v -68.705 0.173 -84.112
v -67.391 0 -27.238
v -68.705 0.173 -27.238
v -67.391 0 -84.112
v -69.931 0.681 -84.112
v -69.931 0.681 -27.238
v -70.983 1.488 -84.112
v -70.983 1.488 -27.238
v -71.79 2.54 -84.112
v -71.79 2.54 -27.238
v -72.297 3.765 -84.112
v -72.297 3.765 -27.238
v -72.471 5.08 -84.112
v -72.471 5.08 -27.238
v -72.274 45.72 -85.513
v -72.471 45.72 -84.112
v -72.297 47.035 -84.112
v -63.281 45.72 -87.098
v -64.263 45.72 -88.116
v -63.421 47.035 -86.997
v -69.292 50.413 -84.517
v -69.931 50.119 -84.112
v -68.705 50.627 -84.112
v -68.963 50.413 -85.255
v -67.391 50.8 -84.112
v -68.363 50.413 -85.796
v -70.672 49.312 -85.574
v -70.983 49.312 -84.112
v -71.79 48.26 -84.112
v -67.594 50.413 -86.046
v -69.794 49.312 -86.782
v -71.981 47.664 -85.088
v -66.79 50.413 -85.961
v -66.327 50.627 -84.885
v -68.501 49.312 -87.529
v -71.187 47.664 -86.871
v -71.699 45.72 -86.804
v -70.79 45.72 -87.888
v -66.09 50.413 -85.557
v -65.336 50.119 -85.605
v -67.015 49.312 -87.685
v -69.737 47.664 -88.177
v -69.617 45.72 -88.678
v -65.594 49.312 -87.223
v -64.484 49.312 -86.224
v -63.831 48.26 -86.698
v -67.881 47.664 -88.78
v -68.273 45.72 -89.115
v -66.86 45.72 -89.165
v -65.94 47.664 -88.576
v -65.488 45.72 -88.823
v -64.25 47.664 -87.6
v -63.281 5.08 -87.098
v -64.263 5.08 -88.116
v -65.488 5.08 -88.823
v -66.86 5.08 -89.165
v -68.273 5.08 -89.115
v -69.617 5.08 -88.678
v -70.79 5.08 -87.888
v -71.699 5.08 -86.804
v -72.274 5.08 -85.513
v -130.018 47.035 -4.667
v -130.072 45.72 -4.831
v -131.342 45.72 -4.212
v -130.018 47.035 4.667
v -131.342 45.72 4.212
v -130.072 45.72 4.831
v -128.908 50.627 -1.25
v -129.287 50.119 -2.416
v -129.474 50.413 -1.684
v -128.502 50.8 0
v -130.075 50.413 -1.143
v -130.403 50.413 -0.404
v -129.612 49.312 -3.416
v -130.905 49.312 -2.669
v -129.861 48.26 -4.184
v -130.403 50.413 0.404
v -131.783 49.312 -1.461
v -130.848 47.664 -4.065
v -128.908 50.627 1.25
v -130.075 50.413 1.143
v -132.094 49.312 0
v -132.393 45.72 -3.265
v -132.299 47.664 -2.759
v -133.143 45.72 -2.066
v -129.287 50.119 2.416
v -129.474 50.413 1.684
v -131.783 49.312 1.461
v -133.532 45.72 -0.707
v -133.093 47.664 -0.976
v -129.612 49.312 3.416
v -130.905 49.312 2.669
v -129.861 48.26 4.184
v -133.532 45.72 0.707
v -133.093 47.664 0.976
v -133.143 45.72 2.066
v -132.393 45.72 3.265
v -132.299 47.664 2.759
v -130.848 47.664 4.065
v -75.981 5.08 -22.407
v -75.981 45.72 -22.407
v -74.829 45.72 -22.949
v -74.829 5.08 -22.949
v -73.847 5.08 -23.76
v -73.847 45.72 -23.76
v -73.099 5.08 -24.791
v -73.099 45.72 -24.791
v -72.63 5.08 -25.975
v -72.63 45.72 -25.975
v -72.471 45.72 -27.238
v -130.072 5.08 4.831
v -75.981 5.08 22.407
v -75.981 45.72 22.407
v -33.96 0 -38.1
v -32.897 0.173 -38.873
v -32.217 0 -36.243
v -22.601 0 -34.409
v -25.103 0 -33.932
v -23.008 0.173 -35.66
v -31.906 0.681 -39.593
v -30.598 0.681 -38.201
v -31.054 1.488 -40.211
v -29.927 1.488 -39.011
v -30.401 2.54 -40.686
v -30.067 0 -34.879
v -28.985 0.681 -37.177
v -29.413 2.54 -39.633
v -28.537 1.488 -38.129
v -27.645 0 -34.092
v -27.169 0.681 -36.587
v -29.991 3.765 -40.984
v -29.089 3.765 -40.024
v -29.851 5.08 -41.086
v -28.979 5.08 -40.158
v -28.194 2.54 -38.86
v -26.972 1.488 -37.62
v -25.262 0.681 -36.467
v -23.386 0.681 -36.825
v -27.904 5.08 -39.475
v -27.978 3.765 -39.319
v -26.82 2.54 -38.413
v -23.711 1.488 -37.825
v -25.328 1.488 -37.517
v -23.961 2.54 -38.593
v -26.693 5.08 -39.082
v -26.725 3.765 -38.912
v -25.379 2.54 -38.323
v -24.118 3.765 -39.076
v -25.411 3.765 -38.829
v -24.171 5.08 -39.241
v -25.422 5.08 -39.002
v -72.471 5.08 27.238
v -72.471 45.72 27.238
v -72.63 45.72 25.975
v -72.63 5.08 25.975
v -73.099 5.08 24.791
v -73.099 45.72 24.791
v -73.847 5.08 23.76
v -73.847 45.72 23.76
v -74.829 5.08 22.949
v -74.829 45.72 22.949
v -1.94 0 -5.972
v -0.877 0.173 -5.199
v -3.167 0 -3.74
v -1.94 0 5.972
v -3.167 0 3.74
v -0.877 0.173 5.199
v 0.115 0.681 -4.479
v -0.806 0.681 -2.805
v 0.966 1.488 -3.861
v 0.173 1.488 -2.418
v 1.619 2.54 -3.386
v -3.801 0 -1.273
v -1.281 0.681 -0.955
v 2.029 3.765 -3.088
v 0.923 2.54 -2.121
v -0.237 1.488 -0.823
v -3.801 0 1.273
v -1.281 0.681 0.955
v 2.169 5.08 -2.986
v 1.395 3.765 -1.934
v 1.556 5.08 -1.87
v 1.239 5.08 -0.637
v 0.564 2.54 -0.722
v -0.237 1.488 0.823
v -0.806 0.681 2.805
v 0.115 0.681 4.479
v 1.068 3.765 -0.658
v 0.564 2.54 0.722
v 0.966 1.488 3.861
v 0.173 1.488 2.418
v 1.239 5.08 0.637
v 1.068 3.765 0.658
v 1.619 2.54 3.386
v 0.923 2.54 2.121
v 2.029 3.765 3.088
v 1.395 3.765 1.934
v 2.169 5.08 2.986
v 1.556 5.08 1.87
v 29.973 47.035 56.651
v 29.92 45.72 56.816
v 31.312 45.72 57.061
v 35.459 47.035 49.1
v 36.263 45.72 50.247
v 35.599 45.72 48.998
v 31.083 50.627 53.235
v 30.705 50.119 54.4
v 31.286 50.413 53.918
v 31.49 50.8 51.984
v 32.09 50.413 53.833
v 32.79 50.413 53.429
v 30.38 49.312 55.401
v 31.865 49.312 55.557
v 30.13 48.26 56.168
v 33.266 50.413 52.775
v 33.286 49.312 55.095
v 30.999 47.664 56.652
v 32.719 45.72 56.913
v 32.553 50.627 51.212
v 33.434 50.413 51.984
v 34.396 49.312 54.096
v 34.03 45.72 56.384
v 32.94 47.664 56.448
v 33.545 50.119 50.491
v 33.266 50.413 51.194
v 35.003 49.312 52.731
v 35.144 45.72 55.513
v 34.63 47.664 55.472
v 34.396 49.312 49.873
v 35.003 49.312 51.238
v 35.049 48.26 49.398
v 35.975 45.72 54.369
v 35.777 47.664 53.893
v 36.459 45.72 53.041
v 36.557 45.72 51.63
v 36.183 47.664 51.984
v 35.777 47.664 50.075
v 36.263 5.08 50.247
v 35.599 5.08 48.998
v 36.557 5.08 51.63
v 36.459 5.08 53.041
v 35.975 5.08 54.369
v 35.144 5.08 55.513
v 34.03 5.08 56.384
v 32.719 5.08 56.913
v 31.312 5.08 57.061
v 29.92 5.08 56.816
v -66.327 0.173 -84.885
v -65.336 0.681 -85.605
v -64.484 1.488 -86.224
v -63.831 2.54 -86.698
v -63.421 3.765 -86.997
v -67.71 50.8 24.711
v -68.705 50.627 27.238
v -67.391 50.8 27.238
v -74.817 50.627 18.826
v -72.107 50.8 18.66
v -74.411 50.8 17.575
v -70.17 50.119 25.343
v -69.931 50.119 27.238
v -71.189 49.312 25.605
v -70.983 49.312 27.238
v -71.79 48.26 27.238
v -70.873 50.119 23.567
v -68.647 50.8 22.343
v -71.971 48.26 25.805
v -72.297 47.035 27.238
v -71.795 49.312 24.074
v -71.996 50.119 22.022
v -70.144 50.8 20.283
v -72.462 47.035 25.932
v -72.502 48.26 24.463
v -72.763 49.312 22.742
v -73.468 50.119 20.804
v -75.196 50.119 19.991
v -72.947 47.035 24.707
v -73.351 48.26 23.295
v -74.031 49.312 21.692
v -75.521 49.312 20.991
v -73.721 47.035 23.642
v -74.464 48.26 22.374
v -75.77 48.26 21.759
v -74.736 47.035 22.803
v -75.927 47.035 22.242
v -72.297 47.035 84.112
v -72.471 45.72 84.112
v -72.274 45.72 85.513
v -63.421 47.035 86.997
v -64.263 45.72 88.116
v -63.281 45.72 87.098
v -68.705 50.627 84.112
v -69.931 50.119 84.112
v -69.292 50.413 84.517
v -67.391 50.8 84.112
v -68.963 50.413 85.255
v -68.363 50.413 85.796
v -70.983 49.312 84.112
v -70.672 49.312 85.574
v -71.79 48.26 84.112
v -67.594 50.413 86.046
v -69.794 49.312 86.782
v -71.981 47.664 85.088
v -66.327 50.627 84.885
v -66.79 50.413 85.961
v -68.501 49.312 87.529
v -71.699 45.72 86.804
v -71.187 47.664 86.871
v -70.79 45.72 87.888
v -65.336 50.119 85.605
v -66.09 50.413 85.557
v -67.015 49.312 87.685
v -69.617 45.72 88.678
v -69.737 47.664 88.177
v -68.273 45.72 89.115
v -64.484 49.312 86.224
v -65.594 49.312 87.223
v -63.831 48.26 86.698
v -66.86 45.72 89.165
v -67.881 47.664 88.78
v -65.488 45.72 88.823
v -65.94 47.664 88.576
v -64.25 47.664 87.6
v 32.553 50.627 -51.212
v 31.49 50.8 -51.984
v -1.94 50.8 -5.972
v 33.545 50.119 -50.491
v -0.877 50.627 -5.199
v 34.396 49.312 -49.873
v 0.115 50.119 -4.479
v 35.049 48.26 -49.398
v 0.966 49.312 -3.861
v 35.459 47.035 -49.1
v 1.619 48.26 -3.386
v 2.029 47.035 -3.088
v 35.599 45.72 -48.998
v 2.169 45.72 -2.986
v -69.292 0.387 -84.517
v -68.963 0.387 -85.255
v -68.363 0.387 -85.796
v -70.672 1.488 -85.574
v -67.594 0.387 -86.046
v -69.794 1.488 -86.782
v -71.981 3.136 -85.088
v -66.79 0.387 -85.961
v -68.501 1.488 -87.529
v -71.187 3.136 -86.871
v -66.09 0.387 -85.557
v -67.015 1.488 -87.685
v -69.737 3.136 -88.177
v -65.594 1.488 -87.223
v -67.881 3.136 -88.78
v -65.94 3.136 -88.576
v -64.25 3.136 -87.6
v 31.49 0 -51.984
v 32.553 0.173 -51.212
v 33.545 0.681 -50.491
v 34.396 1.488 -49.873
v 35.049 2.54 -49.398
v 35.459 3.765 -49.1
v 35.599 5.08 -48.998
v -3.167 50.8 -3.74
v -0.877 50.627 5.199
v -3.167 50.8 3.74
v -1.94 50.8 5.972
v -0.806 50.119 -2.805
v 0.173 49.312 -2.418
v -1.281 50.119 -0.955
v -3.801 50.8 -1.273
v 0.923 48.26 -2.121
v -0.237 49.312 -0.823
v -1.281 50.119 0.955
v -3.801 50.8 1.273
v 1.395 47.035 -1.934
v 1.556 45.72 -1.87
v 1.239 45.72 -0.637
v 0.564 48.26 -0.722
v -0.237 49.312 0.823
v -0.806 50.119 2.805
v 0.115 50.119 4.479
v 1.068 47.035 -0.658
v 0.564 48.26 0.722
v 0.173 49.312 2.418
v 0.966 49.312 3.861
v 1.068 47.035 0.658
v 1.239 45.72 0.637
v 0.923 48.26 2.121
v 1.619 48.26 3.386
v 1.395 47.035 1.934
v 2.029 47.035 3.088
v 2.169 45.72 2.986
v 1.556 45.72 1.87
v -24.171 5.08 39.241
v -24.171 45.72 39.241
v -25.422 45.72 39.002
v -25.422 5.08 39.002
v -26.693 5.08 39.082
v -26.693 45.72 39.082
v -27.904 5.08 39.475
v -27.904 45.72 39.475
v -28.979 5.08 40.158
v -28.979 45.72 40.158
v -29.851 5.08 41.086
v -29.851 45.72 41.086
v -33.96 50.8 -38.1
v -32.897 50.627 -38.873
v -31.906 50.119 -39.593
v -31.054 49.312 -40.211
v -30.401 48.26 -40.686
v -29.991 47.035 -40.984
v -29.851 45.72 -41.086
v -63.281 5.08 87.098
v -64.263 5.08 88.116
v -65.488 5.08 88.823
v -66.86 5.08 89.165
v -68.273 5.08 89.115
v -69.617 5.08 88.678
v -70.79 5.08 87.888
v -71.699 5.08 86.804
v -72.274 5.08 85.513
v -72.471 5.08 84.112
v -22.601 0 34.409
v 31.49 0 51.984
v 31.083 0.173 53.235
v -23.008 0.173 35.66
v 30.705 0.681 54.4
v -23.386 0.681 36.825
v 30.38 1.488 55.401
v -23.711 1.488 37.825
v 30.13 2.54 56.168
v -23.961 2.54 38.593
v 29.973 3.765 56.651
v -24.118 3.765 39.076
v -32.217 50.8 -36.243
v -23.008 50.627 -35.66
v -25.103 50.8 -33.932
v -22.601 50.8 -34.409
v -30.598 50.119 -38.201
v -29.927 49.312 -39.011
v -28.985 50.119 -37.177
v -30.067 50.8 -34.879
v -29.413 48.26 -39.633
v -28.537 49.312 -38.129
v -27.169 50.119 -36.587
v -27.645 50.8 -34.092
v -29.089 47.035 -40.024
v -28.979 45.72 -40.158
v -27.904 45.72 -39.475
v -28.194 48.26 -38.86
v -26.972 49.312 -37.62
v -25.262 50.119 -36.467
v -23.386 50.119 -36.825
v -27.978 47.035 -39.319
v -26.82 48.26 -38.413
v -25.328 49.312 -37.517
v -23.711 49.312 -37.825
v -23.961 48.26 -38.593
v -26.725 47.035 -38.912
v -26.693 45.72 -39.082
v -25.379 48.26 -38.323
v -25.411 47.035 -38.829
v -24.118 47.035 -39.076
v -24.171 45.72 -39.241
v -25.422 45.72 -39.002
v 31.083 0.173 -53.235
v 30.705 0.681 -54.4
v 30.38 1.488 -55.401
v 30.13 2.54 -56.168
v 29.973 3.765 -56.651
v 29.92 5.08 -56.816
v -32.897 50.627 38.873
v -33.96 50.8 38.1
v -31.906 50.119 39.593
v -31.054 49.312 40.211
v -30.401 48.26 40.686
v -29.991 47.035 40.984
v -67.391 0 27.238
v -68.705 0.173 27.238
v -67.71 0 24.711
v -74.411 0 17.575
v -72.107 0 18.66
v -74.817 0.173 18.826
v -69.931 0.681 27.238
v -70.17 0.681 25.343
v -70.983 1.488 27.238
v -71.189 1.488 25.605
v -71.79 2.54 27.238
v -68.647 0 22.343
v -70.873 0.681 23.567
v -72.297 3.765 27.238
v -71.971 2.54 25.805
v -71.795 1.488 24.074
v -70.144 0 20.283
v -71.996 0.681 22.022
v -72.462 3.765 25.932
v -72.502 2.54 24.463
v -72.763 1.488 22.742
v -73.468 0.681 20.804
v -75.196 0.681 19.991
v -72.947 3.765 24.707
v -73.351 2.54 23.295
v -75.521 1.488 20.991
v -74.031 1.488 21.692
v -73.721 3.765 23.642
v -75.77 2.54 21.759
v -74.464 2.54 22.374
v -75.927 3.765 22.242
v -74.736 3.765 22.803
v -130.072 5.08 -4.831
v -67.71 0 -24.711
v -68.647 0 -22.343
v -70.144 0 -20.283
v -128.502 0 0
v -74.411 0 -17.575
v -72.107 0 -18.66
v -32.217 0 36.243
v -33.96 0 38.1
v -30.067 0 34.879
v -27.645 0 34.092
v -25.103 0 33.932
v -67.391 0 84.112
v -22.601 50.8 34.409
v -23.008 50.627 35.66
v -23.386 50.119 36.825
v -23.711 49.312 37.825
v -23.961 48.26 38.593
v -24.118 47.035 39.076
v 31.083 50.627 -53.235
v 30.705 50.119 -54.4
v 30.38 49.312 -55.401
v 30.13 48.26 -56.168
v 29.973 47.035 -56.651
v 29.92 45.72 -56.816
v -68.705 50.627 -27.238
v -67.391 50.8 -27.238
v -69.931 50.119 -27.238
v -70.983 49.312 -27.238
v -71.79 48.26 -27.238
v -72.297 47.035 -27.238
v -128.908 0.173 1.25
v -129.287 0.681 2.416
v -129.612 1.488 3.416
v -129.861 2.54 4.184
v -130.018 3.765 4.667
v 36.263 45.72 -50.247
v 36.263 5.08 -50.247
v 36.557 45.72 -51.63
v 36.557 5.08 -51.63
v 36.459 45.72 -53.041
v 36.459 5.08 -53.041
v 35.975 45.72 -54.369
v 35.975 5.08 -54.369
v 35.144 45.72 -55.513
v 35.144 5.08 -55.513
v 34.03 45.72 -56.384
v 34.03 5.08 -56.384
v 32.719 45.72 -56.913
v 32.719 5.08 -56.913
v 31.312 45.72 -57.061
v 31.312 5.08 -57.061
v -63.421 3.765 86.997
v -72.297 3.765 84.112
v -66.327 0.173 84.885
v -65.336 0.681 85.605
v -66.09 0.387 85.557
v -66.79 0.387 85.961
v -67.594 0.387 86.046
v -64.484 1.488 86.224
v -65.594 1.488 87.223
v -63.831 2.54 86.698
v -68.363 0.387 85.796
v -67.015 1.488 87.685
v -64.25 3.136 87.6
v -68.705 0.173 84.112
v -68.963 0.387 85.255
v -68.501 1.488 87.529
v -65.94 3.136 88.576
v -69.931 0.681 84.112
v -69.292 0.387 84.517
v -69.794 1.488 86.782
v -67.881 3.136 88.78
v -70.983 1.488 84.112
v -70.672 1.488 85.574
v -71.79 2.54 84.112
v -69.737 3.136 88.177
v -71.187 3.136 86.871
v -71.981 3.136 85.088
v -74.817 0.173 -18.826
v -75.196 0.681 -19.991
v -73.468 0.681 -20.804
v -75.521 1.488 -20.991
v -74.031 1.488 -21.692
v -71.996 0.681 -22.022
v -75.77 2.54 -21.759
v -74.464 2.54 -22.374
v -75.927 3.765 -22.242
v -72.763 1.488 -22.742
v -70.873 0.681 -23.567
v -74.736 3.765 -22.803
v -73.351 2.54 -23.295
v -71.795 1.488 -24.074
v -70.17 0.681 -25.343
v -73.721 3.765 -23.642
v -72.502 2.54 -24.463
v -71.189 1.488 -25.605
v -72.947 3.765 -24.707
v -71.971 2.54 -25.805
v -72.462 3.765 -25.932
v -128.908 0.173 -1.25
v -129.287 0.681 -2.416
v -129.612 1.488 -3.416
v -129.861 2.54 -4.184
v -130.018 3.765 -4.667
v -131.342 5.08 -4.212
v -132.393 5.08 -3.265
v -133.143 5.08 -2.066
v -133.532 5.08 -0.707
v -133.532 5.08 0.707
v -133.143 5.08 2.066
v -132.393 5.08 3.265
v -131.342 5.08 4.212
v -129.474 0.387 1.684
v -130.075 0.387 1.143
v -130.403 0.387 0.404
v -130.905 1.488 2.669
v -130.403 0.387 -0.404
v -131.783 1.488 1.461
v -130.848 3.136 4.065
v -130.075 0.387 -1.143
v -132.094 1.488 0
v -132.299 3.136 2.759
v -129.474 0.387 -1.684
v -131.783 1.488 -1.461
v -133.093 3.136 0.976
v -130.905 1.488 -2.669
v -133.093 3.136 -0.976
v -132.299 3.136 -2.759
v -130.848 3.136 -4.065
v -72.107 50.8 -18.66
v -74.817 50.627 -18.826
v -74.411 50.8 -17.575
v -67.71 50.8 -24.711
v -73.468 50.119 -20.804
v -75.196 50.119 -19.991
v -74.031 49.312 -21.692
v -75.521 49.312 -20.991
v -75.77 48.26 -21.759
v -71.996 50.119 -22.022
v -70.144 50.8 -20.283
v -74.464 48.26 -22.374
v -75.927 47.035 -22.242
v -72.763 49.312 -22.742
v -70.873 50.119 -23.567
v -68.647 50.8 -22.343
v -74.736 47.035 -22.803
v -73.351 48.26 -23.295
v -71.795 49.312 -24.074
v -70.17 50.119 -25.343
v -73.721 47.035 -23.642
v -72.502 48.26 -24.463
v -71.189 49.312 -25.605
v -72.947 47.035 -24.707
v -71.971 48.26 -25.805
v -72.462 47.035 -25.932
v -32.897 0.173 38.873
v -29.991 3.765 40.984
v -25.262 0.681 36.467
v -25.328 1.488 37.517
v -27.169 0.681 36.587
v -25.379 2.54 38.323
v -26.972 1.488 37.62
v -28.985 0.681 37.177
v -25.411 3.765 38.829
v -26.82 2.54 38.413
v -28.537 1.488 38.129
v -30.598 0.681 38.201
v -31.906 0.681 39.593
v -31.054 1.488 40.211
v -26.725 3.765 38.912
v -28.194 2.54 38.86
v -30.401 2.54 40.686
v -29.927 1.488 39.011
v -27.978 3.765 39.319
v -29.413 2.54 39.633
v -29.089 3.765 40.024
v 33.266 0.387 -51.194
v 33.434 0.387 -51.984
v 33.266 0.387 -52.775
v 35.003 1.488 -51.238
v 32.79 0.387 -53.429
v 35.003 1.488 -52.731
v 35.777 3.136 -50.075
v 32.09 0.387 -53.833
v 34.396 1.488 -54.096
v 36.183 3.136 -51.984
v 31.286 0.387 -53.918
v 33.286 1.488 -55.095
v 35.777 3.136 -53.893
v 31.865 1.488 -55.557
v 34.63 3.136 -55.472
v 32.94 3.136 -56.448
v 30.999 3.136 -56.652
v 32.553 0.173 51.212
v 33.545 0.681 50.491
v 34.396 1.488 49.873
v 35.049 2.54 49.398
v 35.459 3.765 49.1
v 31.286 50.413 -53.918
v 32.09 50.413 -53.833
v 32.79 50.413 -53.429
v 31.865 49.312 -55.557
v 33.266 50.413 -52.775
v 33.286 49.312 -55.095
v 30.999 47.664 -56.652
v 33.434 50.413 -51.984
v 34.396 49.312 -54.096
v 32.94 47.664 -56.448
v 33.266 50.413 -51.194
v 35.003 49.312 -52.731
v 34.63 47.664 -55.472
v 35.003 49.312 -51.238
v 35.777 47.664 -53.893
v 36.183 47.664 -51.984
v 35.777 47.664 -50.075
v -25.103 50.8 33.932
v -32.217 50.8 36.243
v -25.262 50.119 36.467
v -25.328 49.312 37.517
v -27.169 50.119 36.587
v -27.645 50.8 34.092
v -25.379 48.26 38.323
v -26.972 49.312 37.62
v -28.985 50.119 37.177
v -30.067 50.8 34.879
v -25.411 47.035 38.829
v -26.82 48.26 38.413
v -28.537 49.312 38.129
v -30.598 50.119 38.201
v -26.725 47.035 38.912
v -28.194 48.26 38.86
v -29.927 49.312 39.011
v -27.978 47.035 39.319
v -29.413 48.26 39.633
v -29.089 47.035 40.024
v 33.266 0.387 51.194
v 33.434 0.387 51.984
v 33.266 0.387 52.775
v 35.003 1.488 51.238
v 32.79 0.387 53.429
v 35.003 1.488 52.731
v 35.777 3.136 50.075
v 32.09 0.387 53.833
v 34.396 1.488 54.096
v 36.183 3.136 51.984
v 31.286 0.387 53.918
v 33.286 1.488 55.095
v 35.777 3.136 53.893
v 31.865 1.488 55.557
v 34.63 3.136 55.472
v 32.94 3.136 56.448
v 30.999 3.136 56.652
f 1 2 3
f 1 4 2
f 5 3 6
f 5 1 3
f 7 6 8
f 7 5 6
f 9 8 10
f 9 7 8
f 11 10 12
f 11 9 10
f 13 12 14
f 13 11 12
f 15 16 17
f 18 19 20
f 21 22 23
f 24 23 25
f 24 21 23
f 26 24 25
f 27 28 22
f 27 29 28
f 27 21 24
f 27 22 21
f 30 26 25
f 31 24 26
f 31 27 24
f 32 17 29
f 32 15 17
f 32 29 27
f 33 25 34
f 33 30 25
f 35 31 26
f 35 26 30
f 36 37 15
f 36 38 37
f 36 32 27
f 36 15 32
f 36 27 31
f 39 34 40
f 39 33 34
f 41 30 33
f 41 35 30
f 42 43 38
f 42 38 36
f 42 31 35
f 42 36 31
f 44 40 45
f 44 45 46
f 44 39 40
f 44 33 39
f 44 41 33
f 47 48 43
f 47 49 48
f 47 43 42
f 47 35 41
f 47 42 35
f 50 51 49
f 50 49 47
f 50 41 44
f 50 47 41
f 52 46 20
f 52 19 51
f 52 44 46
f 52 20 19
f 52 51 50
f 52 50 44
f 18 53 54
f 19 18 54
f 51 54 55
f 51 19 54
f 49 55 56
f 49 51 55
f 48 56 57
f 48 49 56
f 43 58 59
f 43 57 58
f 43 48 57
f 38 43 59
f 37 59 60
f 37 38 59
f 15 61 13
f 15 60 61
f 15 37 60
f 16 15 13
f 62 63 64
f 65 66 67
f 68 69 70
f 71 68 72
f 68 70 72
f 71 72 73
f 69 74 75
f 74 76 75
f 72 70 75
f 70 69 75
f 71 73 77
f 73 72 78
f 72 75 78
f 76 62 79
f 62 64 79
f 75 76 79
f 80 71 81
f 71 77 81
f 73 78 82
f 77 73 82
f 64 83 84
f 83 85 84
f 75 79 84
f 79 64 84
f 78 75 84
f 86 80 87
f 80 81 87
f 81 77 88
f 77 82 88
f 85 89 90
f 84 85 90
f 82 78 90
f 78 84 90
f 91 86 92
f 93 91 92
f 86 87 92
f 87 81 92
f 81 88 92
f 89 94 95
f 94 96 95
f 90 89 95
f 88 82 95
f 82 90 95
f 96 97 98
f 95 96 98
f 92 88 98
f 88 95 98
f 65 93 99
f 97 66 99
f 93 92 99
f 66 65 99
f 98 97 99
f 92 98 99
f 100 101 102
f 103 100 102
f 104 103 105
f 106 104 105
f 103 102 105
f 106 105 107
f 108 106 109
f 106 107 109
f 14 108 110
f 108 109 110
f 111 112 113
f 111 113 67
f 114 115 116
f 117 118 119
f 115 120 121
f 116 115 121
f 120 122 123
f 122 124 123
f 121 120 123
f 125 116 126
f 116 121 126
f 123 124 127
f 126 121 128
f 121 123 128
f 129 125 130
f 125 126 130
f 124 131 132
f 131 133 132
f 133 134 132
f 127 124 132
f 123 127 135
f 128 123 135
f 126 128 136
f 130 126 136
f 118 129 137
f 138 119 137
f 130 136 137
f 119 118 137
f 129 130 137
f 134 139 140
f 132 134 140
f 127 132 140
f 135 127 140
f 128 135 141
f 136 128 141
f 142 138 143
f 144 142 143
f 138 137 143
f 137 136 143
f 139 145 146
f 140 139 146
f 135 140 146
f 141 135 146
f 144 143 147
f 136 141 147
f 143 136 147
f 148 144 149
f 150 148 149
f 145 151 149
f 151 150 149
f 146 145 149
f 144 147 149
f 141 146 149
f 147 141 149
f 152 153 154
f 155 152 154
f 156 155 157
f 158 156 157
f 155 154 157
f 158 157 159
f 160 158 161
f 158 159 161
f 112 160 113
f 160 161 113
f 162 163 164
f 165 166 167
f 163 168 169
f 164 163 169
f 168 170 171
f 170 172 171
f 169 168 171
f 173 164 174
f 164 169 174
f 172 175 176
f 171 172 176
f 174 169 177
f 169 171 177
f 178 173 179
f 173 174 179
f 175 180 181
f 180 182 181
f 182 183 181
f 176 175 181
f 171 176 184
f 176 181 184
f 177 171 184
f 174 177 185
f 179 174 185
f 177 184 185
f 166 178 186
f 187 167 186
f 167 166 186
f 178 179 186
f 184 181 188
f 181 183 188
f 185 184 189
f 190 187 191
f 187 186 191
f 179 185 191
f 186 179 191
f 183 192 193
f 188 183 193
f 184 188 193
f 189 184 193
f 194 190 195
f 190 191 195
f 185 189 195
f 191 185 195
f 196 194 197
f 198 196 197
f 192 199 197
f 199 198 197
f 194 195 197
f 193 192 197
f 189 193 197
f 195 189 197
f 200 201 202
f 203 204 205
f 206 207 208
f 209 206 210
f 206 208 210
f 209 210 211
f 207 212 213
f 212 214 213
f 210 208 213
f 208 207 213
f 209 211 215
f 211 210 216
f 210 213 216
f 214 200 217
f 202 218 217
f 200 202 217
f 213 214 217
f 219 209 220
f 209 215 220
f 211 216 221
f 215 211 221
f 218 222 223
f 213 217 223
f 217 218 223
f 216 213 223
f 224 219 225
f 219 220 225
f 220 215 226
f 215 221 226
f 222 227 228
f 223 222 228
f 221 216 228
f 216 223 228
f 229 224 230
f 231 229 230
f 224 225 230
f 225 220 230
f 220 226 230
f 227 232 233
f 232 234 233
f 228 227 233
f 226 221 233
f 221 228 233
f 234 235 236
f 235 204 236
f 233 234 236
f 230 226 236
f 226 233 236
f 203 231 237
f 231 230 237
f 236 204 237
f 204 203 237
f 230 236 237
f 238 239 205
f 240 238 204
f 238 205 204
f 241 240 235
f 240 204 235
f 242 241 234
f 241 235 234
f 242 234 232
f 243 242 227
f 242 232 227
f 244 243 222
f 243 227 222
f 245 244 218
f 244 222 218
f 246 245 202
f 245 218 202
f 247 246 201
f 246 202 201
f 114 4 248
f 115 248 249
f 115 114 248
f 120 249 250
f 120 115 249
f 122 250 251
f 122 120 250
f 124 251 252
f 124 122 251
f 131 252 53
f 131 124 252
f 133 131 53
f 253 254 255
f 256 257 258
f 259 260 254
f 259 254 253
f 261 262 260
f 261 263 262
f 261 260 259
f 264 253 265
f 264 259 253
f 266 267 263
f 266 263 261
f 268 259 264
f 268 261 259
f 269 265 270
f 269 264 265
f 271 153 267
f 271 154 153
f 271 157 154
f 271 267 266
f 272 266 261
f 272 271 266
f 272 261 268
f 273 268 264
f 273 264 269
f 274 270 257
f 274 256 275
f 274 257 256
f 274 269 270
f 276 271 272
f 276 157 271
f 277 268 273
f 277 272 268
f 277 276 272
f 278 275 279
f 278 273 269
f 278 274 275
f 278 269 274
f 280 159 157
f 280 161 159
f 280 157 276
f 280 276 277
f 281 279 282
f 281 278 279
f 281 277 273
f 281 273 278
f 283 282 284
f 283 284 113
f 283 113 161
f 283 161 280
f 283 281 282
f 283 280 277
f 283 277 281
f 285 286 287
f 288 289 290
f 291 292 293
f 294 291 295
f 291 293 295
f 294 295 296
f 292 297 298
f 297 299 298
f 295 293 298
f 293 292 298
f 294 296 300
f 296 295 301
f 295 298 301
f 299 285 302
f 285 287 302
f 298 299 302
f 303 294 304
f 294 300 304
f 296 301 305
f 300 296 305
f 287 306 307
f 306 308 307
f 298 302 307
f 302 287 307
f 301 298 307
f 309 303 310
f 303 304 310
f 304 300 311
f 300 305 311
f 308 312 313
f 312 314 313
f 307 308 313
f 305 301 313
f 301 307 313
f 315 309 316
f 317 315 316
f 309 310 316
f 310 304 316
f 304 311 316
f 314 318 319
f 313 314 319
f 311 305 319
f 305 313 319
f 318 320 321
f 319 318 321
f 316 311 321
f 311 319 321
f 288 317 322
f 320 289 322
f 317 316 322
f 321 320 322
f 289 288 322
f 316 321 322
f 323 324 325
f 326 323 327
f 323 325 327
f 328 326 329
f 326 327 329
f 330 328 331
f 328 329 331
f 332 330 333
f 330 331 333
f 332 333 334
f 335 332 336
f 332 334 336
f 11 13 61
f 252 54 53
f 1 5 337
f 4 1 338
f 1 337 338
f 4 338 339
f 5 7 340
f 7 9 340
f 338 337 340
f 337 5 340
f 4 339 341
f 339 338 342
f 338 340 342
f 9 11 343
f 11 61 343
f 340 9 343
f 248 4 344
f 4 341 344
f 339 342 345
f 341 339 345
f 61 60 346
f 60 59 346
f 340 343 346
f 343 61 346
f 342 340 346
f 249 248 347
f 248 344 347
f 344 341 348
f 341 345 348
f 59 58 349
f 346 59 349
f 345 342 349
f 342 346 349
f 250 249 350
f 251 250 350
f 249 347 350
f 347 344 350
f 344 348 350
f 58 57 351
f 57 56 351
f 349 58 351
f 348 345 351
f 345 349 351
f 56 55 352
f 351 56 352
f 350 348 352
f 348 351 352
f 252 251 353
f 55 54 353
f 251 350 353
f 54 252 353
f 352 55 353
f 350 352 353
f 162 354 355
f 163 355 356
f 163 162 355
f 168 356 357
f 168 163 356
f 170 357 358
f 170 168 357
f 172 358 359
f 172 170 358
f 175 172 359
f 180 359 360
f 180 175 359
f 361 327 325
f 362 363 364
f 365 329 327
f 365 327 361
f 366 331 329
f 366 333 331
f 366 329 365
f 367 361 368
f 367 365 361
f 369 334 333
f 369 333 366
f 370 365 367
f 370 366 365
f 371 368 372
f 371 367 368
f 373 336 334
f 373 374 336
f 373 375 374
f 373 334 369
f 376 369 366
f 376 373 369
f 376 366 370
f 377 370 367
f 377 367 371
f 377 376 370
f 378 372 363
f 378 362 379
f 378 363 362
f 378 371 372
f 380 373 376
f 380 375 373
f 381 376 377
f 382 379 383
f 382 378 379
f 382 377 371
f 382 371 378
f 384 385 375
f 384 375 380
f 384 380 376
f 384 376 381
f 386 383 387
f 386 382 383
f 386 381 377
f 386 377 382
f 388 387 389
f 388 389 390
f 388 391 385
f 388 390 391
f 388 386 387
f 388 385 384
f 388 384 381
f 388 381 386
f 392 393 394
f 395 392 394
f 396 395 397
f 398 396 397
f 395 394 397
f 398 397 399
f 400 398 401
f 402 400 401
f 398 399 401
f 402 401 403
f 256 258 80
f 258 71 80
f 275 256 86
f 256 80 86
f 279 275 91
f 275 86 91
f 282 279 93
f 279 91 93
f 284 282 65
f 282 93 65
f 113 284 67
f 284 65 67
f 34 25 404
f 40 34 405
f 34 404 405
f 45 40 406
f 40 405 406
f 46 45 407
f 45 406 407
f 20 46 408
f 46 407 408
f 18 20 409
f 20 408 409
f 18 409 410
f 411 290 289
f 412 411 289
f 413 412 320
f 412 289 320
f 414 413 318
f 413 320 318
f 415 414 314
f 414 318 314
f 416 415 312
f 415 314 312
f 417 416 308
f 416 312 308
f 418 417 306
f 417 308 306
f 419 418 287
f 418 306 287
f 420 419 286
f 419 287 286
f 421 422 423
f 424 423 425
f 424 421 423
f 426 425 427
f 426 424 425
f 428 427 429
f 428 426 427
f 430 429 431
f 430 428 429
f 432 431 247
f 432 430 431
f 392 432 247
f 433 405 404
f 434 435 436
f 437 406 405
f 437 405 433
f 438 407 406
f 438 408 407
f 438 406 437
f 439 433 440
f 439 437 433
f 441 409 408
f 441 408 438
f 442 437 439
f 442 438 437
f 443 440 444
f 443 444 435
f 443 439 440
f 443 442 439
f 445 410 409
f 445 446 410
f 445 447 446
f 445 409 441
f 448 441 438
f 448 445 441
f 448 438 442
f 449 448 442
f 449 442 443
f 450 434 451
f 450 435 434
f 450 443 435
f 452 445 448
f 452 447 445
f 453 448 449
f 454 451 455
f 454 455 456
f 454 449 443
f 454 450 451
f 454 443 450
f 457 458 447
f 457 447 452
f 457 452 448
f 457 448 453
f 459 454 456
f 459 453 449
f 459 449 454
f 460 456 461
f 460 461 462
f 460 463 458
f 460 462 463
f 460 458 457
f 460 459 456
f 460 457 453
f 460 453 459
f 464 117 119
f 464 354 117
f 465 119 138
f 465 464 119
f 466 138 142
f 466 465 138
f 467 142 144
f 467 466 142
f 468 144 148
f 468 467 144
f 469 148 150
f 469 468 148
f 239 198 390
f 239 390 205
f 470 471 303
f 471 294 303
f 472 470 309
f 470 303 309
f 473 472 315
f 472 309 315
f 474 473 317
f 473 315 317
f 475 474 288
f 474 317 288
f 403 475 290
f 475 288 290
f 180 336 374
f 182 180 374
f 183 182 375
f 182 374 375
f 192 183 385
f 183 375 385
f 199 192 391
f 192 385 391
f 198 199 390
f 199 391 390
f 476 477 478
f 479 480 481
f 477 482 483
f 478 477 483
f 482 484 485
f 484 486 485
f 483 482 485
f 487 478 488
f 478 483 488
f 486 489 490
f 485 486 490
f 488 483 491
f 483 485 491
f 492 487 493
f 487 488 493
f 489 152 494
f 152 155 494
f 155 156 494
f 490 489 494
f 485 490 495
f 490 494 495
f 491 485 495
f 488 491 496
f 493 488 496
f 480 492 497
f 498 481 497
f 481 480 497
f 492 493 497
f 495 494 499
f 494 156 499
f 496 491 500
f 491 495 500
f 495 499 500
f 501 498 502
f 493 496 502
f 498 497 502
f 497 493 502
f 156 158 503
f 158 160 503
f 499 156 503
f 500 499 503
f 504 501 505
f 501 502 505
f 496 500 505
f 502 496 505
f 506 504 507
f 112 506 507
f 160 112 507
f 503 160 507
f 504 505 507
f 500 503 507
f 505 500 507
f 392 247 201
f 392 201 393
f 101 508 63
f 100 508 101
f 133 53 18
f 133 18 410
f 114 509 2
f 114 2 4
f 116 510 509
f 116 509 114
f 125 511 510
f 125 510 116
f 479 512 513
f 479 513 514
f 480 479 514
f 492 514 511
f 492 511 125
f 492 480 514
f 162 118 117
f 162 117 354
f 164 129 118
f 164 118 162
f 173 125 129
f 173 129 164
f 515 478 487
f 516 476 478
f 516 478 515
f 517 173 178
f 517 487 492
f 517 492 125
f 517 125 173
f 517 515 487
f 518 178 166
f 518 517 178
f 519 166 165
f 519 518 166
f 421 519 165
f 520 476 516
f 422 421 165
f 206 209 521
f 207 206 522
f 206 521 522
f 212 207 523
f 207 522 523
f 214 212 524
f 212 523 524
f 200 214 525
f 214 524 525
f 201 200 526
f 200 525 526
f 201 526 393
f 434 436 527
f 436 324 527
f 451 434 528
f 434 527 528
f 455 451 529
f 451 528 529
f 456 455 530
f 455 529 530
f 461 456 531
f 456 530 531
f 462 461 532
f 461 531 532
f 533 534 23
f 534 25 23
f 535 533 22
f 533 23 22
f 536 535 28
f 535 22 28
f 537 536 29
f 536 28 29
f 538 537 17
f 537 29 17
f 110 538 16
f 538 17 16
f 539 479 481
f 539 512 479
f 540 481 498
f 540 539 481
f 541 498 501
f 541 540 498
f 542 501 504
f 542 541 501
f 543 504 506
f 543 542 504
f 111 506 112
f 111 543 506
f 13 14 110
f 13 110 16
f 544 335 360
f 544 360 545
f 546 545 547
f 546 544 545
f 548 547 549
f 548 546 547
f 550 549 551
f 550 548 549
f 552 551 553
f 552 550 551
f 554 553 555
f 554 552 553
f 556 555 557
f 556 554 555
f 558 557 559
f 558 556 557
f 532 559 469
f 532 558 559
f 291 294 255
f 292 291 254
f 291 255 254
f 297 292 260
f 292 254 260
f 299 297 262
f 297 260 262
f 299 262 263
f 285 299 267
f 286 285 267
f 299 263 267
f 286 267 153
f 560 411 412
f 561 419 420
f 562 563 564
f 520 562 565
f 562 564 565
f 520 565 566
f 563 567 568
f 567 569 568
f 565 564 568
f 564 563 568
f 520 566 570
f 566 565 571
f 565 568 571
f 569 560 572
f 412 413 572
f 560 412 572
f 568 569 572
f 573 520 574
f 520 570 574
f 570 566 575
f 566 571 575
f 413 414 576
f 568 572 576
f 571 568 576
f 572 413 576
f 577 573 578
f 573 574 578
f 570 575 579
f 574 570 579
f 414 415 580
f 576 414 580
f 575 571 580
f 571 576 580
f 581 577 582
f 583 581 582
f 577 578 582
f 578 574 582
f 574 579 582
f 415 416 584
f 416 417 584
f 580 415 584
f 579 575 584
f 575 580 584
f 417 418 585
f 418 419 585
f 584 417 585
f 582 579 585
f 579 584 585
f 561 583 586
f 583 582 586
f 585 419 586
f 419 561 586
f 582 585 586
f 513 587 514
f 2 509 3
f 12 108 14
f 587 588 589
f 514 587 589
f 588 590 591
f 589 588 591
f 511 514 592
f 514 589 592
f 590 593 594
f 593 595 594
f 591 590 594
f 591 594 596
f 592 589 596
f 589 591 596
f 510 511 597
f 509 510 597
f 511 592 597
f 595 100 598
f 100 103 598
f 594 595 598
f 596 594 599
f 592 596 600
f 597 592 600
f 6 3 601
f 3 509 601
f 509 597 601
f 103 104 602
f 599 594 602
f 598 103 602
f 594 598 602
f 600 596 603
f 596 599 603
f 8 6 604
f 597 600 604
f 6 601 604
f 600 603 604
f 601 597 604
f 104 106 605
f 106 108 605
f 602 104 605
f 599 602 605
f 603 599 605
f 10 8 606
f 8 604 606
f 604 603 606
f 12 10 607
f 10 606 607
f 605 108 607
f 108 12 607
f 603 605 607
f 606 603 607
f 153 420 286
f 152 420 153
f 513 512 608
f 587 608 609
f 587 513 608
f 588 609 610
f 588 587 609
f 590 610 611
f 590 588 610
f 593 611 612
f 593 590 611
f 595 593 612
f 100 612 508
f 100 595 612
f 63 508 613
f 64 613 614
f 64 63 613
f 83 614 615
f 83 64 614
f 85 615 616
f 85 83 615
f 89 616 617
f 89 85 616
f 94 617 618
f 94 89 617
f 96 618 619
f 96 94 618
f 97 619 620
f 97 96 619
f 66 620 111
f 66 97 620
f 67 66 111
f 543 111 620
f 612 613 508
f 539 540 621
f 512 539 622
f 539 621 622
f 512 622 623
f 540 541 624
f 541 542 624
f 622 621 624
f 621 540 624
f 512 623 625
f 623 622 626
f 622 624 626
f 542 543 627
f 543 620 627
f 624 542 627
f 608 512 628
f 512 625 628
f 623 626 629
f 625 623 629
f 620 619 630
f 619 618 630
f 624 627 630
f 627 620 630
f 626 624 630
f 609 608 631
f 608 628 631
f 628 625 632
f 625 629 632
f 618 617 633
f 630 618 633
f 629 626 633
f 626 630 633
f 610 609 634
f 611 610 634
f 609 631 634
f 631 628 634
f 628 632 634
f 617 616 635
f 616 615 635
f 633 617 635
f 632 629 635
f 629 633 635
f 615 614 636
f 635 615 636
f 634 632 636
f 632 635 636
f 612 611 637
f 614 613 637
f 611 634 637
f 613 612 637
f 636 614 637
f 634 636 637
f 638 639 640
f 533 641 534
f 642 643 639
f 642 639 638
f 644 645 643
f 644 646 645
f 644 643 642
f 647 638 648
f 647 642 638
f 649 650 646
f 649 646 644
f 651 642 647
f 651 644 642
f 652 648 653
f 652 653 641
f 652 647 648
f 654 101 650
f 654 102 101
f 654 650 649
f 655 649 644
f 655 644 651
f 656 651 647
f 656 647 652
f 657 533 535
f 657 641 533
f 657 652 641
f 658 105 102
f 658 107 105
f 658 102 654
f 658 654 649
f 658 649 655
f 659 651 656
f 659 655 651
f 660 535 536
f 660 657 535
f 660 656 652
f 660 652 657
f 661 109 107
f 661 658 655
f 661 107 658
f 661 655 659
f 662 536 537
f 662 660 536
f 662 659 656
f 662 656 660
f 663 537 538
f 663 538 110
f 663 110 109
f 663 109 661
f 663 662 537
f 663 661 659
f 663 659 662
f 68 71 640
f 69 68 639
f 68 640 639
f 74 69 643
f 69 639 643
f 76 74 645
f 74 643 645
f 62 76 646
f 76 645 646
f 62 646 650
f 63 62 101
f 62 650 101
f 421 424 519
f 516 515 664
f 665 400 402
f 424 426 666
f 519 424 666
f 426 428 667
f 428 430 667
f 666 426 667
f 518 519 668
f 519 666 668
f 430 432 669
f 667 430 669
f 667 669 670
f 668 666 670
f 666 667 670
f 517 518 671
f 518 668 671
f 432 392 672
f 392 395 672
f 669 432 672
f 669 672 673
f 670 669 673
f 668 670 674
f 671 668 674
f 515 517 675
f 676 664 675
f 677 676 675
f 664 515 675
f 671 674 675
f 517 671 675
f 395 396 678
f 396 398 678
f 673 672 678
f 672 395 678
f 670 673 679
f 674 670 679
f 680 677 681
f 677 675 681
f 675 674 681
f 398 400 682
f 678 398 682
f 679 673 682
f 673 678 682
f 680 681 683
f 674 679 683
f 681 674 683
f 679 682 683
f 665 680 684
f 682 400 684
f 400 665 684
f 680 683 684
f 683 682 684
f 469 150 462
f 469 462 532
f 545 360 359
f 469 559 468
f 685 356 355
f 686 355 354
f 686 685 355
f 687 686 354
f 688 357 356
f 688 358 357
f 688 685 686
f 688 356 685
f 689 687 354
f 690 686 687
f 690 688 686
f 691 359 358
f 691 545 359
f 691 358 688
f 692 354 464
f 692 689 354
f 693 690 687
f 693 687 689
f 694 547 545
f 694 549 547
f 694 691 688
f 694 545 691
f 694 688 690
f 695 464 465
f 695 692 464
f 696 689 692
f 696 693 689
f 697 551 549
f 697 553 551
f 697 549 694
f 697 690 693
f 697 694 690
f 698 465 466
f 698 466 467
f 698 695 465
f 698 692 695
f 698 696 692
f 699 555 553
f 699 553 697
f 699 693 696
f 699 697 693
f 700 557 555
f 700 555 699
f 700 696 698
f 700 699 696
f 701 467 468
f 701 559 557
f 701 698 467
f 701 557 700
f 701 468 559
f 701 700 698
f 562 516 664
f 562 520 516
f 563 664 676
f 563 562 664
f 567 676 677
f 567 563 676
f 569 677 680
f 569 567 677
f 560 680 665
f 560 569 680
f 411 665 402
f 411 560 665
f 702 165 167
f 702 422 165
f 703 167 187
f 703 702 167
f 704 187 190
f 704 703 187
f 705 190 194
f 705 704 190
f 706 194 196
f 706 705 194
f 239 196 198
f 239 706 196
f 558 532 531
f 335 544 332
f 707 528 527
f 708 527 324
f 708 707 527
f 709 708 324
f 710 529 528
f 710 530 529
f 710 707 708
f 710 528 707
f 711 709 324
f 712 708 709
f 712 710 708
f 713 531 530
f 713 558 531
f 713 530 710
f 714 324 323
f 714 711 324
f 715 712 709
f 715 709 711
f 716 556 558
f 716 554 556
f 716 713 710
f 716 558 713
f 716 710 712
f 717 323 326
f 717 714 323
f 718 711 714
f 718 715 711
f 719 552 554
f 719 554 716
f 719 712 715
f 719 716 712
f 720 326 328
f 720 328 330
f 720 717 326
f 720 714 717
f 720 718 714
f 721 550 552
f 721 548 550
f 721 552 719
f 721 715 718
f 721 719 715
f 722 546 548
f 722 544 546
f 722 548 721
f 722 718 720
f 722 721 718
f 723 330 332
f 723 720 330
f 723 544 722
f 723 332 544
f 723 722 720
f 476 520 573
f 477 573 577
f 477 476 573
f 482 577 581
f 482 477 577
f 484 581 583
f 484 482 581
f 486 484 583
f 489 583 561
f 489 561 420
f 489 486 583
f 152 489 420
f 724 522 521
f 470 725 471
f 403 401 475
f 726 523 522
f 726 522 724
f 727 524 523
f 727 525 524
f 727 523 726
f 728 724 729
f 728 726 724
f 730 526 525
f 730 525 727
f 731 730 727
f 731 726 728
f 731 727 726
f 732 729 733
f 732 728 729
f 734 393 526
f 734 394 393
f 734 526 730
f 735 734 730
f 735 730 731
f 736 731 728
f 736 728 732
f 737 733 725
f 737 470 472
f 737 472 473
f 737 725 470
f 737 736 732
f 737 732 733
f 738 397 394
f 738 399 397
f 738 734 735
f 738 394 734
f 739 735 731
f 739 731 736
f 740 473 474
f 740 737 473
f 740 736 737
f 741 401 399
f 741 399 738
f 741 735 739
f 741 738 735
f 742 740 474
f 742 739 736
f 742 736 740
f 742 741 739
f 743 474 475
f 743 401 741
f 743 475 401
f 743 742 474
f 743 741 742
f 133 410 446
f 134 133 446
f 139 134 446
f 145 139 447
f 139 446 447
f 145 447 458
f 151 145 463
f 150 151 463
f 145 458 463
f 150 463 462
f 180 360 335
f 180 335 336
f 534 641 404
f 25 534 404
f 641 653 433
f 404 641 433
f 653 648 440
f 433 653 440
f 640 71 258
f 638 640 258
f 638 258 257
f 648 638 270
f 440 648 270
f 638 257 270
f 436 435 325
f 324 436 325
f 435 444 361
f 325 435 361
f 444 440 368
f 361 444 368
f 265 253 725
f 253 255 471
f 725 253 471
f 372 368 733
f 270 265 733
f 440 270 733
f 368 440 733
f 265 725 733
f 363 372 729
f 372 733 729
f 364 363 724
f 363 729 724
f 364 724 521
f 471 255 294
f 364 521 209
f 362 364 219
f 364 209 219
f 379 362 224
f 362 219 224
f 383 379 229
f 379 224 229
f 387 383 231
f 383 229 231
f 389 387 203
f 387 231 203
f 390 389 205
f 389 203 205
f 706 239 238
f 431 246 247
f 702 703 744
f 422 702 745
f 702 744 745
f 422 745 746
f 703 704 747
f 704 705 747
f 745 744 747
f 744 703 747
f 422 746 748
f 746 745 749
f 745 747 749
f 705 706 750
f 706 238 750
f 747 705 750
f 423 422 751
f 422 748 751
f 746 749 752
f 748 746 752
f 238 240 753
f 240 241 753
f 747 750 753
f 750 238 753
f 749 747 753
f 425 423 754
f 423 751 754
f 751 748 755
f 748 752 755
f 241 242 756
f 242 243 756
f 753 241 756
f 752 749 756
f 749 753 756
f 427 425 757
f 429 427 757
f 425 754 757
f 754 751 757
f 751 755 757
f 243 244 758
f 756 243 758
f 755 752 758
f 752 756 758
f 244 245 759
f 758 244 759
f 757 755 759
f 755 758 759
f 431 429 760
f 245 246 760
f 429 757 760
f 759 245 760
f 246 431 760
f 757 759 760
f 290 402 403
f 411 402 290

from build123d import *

# Parameters (mm, degrees)
F1_DEPTH = 50.8
F2_F1_R  = 5.08
F2_F2_R  = 5.08


with BuildPart() as f1:
    # F0 (on Front) → F1 (new body)
    with BuildSketch(Plane.XZ):
        Polygon((44.7892362247, -61.6470949714), (0, 0), (44.7892362247, 61.6470949714), (-27.681270317, 38.1), (-72.4705065417, 99.7470949714), (-72.4705065417, 23.5470949714), (-144.9410130834, 0), (-72.4705065417, -23.5470949714), (-72.4705065417, -99.7470949714), (-27.681270317, -38.1), align=None)
    extrude(amount=-F1_DEPTH)

    # F2: fillet of radius 5.08 on 21 edges, made by hand

    # F2_f1
    f2_f1_edges = [f1.edges().sort_by_distance(p)[0] for p in [
        (-27.681270317, 25.4, -38.1),
        (-72.4705065417, 25.4, -23.5470949714),
        (-72.4705065417, 25.4, 23.5470949714),
        (-27.681270317, 25.4, 38.1),
        (0, 25.4, 0),
    ]]
    fillet(f2_f1_edges, radius=F2_F1_R)

    # F2_f2
    f2_f2_edges = [f1.edges().sort_by_distance(p)[0] for p in [
        (-72.4705065417, 25.4, 99.7470949714),
        (-144.9410130834, 25.4, 0),
        (44.7892362247, 25.4, 61.6470949714),
        (44.7892362247, 25.4, -61.6470949714),
        (-72.4705065417, 25.4, -99.7470949714),
        (-72.4705065417, 50.8, -63.4925129925),
        (-51.1605979265, 50.8, -70.4165220265),
        (10.3090797881, 50.8, -50.4438130159),
        (-110.4608566468, 50.8, 11.2032819554),
        (-51.1605979265, 50.8, 70.4165220265),
        (23.4793276095, 50.8, 32.3165220265),
        (23.4793276095, 0, 32.3165220265),
        (10.3090797881, 0, 50.4438130159),
        (-72.4705065417, 0, 63.4925129925),
        (-110.4608566468, 0, -11.2032819554),
        (-51.1605979265, 0, -70.4165220265),
        (-27.3106893113, 0, -39.2405310605),
        (-73.4407002103, 0, -24.251981932),
        (-73.4407002103, 0, 24.251981932),
        (-27.3106893113, 0, 39.2405310605),
        (1.1992253257, 0, 0),
        (1.1992253257, 50.8, 0),
        (-27.3106893113, 50.8, 39.2405310605),
        (-73.4407002103, 50.8, 24.251981932),
        (-27.3106893113, 50.8, -39.2405310605),
        (-73.4407002103, 50.8, -24.251981932),
    ]]
    fillet(f2_f2_edges, radius=F2_F2_R)


solid = f1.part
